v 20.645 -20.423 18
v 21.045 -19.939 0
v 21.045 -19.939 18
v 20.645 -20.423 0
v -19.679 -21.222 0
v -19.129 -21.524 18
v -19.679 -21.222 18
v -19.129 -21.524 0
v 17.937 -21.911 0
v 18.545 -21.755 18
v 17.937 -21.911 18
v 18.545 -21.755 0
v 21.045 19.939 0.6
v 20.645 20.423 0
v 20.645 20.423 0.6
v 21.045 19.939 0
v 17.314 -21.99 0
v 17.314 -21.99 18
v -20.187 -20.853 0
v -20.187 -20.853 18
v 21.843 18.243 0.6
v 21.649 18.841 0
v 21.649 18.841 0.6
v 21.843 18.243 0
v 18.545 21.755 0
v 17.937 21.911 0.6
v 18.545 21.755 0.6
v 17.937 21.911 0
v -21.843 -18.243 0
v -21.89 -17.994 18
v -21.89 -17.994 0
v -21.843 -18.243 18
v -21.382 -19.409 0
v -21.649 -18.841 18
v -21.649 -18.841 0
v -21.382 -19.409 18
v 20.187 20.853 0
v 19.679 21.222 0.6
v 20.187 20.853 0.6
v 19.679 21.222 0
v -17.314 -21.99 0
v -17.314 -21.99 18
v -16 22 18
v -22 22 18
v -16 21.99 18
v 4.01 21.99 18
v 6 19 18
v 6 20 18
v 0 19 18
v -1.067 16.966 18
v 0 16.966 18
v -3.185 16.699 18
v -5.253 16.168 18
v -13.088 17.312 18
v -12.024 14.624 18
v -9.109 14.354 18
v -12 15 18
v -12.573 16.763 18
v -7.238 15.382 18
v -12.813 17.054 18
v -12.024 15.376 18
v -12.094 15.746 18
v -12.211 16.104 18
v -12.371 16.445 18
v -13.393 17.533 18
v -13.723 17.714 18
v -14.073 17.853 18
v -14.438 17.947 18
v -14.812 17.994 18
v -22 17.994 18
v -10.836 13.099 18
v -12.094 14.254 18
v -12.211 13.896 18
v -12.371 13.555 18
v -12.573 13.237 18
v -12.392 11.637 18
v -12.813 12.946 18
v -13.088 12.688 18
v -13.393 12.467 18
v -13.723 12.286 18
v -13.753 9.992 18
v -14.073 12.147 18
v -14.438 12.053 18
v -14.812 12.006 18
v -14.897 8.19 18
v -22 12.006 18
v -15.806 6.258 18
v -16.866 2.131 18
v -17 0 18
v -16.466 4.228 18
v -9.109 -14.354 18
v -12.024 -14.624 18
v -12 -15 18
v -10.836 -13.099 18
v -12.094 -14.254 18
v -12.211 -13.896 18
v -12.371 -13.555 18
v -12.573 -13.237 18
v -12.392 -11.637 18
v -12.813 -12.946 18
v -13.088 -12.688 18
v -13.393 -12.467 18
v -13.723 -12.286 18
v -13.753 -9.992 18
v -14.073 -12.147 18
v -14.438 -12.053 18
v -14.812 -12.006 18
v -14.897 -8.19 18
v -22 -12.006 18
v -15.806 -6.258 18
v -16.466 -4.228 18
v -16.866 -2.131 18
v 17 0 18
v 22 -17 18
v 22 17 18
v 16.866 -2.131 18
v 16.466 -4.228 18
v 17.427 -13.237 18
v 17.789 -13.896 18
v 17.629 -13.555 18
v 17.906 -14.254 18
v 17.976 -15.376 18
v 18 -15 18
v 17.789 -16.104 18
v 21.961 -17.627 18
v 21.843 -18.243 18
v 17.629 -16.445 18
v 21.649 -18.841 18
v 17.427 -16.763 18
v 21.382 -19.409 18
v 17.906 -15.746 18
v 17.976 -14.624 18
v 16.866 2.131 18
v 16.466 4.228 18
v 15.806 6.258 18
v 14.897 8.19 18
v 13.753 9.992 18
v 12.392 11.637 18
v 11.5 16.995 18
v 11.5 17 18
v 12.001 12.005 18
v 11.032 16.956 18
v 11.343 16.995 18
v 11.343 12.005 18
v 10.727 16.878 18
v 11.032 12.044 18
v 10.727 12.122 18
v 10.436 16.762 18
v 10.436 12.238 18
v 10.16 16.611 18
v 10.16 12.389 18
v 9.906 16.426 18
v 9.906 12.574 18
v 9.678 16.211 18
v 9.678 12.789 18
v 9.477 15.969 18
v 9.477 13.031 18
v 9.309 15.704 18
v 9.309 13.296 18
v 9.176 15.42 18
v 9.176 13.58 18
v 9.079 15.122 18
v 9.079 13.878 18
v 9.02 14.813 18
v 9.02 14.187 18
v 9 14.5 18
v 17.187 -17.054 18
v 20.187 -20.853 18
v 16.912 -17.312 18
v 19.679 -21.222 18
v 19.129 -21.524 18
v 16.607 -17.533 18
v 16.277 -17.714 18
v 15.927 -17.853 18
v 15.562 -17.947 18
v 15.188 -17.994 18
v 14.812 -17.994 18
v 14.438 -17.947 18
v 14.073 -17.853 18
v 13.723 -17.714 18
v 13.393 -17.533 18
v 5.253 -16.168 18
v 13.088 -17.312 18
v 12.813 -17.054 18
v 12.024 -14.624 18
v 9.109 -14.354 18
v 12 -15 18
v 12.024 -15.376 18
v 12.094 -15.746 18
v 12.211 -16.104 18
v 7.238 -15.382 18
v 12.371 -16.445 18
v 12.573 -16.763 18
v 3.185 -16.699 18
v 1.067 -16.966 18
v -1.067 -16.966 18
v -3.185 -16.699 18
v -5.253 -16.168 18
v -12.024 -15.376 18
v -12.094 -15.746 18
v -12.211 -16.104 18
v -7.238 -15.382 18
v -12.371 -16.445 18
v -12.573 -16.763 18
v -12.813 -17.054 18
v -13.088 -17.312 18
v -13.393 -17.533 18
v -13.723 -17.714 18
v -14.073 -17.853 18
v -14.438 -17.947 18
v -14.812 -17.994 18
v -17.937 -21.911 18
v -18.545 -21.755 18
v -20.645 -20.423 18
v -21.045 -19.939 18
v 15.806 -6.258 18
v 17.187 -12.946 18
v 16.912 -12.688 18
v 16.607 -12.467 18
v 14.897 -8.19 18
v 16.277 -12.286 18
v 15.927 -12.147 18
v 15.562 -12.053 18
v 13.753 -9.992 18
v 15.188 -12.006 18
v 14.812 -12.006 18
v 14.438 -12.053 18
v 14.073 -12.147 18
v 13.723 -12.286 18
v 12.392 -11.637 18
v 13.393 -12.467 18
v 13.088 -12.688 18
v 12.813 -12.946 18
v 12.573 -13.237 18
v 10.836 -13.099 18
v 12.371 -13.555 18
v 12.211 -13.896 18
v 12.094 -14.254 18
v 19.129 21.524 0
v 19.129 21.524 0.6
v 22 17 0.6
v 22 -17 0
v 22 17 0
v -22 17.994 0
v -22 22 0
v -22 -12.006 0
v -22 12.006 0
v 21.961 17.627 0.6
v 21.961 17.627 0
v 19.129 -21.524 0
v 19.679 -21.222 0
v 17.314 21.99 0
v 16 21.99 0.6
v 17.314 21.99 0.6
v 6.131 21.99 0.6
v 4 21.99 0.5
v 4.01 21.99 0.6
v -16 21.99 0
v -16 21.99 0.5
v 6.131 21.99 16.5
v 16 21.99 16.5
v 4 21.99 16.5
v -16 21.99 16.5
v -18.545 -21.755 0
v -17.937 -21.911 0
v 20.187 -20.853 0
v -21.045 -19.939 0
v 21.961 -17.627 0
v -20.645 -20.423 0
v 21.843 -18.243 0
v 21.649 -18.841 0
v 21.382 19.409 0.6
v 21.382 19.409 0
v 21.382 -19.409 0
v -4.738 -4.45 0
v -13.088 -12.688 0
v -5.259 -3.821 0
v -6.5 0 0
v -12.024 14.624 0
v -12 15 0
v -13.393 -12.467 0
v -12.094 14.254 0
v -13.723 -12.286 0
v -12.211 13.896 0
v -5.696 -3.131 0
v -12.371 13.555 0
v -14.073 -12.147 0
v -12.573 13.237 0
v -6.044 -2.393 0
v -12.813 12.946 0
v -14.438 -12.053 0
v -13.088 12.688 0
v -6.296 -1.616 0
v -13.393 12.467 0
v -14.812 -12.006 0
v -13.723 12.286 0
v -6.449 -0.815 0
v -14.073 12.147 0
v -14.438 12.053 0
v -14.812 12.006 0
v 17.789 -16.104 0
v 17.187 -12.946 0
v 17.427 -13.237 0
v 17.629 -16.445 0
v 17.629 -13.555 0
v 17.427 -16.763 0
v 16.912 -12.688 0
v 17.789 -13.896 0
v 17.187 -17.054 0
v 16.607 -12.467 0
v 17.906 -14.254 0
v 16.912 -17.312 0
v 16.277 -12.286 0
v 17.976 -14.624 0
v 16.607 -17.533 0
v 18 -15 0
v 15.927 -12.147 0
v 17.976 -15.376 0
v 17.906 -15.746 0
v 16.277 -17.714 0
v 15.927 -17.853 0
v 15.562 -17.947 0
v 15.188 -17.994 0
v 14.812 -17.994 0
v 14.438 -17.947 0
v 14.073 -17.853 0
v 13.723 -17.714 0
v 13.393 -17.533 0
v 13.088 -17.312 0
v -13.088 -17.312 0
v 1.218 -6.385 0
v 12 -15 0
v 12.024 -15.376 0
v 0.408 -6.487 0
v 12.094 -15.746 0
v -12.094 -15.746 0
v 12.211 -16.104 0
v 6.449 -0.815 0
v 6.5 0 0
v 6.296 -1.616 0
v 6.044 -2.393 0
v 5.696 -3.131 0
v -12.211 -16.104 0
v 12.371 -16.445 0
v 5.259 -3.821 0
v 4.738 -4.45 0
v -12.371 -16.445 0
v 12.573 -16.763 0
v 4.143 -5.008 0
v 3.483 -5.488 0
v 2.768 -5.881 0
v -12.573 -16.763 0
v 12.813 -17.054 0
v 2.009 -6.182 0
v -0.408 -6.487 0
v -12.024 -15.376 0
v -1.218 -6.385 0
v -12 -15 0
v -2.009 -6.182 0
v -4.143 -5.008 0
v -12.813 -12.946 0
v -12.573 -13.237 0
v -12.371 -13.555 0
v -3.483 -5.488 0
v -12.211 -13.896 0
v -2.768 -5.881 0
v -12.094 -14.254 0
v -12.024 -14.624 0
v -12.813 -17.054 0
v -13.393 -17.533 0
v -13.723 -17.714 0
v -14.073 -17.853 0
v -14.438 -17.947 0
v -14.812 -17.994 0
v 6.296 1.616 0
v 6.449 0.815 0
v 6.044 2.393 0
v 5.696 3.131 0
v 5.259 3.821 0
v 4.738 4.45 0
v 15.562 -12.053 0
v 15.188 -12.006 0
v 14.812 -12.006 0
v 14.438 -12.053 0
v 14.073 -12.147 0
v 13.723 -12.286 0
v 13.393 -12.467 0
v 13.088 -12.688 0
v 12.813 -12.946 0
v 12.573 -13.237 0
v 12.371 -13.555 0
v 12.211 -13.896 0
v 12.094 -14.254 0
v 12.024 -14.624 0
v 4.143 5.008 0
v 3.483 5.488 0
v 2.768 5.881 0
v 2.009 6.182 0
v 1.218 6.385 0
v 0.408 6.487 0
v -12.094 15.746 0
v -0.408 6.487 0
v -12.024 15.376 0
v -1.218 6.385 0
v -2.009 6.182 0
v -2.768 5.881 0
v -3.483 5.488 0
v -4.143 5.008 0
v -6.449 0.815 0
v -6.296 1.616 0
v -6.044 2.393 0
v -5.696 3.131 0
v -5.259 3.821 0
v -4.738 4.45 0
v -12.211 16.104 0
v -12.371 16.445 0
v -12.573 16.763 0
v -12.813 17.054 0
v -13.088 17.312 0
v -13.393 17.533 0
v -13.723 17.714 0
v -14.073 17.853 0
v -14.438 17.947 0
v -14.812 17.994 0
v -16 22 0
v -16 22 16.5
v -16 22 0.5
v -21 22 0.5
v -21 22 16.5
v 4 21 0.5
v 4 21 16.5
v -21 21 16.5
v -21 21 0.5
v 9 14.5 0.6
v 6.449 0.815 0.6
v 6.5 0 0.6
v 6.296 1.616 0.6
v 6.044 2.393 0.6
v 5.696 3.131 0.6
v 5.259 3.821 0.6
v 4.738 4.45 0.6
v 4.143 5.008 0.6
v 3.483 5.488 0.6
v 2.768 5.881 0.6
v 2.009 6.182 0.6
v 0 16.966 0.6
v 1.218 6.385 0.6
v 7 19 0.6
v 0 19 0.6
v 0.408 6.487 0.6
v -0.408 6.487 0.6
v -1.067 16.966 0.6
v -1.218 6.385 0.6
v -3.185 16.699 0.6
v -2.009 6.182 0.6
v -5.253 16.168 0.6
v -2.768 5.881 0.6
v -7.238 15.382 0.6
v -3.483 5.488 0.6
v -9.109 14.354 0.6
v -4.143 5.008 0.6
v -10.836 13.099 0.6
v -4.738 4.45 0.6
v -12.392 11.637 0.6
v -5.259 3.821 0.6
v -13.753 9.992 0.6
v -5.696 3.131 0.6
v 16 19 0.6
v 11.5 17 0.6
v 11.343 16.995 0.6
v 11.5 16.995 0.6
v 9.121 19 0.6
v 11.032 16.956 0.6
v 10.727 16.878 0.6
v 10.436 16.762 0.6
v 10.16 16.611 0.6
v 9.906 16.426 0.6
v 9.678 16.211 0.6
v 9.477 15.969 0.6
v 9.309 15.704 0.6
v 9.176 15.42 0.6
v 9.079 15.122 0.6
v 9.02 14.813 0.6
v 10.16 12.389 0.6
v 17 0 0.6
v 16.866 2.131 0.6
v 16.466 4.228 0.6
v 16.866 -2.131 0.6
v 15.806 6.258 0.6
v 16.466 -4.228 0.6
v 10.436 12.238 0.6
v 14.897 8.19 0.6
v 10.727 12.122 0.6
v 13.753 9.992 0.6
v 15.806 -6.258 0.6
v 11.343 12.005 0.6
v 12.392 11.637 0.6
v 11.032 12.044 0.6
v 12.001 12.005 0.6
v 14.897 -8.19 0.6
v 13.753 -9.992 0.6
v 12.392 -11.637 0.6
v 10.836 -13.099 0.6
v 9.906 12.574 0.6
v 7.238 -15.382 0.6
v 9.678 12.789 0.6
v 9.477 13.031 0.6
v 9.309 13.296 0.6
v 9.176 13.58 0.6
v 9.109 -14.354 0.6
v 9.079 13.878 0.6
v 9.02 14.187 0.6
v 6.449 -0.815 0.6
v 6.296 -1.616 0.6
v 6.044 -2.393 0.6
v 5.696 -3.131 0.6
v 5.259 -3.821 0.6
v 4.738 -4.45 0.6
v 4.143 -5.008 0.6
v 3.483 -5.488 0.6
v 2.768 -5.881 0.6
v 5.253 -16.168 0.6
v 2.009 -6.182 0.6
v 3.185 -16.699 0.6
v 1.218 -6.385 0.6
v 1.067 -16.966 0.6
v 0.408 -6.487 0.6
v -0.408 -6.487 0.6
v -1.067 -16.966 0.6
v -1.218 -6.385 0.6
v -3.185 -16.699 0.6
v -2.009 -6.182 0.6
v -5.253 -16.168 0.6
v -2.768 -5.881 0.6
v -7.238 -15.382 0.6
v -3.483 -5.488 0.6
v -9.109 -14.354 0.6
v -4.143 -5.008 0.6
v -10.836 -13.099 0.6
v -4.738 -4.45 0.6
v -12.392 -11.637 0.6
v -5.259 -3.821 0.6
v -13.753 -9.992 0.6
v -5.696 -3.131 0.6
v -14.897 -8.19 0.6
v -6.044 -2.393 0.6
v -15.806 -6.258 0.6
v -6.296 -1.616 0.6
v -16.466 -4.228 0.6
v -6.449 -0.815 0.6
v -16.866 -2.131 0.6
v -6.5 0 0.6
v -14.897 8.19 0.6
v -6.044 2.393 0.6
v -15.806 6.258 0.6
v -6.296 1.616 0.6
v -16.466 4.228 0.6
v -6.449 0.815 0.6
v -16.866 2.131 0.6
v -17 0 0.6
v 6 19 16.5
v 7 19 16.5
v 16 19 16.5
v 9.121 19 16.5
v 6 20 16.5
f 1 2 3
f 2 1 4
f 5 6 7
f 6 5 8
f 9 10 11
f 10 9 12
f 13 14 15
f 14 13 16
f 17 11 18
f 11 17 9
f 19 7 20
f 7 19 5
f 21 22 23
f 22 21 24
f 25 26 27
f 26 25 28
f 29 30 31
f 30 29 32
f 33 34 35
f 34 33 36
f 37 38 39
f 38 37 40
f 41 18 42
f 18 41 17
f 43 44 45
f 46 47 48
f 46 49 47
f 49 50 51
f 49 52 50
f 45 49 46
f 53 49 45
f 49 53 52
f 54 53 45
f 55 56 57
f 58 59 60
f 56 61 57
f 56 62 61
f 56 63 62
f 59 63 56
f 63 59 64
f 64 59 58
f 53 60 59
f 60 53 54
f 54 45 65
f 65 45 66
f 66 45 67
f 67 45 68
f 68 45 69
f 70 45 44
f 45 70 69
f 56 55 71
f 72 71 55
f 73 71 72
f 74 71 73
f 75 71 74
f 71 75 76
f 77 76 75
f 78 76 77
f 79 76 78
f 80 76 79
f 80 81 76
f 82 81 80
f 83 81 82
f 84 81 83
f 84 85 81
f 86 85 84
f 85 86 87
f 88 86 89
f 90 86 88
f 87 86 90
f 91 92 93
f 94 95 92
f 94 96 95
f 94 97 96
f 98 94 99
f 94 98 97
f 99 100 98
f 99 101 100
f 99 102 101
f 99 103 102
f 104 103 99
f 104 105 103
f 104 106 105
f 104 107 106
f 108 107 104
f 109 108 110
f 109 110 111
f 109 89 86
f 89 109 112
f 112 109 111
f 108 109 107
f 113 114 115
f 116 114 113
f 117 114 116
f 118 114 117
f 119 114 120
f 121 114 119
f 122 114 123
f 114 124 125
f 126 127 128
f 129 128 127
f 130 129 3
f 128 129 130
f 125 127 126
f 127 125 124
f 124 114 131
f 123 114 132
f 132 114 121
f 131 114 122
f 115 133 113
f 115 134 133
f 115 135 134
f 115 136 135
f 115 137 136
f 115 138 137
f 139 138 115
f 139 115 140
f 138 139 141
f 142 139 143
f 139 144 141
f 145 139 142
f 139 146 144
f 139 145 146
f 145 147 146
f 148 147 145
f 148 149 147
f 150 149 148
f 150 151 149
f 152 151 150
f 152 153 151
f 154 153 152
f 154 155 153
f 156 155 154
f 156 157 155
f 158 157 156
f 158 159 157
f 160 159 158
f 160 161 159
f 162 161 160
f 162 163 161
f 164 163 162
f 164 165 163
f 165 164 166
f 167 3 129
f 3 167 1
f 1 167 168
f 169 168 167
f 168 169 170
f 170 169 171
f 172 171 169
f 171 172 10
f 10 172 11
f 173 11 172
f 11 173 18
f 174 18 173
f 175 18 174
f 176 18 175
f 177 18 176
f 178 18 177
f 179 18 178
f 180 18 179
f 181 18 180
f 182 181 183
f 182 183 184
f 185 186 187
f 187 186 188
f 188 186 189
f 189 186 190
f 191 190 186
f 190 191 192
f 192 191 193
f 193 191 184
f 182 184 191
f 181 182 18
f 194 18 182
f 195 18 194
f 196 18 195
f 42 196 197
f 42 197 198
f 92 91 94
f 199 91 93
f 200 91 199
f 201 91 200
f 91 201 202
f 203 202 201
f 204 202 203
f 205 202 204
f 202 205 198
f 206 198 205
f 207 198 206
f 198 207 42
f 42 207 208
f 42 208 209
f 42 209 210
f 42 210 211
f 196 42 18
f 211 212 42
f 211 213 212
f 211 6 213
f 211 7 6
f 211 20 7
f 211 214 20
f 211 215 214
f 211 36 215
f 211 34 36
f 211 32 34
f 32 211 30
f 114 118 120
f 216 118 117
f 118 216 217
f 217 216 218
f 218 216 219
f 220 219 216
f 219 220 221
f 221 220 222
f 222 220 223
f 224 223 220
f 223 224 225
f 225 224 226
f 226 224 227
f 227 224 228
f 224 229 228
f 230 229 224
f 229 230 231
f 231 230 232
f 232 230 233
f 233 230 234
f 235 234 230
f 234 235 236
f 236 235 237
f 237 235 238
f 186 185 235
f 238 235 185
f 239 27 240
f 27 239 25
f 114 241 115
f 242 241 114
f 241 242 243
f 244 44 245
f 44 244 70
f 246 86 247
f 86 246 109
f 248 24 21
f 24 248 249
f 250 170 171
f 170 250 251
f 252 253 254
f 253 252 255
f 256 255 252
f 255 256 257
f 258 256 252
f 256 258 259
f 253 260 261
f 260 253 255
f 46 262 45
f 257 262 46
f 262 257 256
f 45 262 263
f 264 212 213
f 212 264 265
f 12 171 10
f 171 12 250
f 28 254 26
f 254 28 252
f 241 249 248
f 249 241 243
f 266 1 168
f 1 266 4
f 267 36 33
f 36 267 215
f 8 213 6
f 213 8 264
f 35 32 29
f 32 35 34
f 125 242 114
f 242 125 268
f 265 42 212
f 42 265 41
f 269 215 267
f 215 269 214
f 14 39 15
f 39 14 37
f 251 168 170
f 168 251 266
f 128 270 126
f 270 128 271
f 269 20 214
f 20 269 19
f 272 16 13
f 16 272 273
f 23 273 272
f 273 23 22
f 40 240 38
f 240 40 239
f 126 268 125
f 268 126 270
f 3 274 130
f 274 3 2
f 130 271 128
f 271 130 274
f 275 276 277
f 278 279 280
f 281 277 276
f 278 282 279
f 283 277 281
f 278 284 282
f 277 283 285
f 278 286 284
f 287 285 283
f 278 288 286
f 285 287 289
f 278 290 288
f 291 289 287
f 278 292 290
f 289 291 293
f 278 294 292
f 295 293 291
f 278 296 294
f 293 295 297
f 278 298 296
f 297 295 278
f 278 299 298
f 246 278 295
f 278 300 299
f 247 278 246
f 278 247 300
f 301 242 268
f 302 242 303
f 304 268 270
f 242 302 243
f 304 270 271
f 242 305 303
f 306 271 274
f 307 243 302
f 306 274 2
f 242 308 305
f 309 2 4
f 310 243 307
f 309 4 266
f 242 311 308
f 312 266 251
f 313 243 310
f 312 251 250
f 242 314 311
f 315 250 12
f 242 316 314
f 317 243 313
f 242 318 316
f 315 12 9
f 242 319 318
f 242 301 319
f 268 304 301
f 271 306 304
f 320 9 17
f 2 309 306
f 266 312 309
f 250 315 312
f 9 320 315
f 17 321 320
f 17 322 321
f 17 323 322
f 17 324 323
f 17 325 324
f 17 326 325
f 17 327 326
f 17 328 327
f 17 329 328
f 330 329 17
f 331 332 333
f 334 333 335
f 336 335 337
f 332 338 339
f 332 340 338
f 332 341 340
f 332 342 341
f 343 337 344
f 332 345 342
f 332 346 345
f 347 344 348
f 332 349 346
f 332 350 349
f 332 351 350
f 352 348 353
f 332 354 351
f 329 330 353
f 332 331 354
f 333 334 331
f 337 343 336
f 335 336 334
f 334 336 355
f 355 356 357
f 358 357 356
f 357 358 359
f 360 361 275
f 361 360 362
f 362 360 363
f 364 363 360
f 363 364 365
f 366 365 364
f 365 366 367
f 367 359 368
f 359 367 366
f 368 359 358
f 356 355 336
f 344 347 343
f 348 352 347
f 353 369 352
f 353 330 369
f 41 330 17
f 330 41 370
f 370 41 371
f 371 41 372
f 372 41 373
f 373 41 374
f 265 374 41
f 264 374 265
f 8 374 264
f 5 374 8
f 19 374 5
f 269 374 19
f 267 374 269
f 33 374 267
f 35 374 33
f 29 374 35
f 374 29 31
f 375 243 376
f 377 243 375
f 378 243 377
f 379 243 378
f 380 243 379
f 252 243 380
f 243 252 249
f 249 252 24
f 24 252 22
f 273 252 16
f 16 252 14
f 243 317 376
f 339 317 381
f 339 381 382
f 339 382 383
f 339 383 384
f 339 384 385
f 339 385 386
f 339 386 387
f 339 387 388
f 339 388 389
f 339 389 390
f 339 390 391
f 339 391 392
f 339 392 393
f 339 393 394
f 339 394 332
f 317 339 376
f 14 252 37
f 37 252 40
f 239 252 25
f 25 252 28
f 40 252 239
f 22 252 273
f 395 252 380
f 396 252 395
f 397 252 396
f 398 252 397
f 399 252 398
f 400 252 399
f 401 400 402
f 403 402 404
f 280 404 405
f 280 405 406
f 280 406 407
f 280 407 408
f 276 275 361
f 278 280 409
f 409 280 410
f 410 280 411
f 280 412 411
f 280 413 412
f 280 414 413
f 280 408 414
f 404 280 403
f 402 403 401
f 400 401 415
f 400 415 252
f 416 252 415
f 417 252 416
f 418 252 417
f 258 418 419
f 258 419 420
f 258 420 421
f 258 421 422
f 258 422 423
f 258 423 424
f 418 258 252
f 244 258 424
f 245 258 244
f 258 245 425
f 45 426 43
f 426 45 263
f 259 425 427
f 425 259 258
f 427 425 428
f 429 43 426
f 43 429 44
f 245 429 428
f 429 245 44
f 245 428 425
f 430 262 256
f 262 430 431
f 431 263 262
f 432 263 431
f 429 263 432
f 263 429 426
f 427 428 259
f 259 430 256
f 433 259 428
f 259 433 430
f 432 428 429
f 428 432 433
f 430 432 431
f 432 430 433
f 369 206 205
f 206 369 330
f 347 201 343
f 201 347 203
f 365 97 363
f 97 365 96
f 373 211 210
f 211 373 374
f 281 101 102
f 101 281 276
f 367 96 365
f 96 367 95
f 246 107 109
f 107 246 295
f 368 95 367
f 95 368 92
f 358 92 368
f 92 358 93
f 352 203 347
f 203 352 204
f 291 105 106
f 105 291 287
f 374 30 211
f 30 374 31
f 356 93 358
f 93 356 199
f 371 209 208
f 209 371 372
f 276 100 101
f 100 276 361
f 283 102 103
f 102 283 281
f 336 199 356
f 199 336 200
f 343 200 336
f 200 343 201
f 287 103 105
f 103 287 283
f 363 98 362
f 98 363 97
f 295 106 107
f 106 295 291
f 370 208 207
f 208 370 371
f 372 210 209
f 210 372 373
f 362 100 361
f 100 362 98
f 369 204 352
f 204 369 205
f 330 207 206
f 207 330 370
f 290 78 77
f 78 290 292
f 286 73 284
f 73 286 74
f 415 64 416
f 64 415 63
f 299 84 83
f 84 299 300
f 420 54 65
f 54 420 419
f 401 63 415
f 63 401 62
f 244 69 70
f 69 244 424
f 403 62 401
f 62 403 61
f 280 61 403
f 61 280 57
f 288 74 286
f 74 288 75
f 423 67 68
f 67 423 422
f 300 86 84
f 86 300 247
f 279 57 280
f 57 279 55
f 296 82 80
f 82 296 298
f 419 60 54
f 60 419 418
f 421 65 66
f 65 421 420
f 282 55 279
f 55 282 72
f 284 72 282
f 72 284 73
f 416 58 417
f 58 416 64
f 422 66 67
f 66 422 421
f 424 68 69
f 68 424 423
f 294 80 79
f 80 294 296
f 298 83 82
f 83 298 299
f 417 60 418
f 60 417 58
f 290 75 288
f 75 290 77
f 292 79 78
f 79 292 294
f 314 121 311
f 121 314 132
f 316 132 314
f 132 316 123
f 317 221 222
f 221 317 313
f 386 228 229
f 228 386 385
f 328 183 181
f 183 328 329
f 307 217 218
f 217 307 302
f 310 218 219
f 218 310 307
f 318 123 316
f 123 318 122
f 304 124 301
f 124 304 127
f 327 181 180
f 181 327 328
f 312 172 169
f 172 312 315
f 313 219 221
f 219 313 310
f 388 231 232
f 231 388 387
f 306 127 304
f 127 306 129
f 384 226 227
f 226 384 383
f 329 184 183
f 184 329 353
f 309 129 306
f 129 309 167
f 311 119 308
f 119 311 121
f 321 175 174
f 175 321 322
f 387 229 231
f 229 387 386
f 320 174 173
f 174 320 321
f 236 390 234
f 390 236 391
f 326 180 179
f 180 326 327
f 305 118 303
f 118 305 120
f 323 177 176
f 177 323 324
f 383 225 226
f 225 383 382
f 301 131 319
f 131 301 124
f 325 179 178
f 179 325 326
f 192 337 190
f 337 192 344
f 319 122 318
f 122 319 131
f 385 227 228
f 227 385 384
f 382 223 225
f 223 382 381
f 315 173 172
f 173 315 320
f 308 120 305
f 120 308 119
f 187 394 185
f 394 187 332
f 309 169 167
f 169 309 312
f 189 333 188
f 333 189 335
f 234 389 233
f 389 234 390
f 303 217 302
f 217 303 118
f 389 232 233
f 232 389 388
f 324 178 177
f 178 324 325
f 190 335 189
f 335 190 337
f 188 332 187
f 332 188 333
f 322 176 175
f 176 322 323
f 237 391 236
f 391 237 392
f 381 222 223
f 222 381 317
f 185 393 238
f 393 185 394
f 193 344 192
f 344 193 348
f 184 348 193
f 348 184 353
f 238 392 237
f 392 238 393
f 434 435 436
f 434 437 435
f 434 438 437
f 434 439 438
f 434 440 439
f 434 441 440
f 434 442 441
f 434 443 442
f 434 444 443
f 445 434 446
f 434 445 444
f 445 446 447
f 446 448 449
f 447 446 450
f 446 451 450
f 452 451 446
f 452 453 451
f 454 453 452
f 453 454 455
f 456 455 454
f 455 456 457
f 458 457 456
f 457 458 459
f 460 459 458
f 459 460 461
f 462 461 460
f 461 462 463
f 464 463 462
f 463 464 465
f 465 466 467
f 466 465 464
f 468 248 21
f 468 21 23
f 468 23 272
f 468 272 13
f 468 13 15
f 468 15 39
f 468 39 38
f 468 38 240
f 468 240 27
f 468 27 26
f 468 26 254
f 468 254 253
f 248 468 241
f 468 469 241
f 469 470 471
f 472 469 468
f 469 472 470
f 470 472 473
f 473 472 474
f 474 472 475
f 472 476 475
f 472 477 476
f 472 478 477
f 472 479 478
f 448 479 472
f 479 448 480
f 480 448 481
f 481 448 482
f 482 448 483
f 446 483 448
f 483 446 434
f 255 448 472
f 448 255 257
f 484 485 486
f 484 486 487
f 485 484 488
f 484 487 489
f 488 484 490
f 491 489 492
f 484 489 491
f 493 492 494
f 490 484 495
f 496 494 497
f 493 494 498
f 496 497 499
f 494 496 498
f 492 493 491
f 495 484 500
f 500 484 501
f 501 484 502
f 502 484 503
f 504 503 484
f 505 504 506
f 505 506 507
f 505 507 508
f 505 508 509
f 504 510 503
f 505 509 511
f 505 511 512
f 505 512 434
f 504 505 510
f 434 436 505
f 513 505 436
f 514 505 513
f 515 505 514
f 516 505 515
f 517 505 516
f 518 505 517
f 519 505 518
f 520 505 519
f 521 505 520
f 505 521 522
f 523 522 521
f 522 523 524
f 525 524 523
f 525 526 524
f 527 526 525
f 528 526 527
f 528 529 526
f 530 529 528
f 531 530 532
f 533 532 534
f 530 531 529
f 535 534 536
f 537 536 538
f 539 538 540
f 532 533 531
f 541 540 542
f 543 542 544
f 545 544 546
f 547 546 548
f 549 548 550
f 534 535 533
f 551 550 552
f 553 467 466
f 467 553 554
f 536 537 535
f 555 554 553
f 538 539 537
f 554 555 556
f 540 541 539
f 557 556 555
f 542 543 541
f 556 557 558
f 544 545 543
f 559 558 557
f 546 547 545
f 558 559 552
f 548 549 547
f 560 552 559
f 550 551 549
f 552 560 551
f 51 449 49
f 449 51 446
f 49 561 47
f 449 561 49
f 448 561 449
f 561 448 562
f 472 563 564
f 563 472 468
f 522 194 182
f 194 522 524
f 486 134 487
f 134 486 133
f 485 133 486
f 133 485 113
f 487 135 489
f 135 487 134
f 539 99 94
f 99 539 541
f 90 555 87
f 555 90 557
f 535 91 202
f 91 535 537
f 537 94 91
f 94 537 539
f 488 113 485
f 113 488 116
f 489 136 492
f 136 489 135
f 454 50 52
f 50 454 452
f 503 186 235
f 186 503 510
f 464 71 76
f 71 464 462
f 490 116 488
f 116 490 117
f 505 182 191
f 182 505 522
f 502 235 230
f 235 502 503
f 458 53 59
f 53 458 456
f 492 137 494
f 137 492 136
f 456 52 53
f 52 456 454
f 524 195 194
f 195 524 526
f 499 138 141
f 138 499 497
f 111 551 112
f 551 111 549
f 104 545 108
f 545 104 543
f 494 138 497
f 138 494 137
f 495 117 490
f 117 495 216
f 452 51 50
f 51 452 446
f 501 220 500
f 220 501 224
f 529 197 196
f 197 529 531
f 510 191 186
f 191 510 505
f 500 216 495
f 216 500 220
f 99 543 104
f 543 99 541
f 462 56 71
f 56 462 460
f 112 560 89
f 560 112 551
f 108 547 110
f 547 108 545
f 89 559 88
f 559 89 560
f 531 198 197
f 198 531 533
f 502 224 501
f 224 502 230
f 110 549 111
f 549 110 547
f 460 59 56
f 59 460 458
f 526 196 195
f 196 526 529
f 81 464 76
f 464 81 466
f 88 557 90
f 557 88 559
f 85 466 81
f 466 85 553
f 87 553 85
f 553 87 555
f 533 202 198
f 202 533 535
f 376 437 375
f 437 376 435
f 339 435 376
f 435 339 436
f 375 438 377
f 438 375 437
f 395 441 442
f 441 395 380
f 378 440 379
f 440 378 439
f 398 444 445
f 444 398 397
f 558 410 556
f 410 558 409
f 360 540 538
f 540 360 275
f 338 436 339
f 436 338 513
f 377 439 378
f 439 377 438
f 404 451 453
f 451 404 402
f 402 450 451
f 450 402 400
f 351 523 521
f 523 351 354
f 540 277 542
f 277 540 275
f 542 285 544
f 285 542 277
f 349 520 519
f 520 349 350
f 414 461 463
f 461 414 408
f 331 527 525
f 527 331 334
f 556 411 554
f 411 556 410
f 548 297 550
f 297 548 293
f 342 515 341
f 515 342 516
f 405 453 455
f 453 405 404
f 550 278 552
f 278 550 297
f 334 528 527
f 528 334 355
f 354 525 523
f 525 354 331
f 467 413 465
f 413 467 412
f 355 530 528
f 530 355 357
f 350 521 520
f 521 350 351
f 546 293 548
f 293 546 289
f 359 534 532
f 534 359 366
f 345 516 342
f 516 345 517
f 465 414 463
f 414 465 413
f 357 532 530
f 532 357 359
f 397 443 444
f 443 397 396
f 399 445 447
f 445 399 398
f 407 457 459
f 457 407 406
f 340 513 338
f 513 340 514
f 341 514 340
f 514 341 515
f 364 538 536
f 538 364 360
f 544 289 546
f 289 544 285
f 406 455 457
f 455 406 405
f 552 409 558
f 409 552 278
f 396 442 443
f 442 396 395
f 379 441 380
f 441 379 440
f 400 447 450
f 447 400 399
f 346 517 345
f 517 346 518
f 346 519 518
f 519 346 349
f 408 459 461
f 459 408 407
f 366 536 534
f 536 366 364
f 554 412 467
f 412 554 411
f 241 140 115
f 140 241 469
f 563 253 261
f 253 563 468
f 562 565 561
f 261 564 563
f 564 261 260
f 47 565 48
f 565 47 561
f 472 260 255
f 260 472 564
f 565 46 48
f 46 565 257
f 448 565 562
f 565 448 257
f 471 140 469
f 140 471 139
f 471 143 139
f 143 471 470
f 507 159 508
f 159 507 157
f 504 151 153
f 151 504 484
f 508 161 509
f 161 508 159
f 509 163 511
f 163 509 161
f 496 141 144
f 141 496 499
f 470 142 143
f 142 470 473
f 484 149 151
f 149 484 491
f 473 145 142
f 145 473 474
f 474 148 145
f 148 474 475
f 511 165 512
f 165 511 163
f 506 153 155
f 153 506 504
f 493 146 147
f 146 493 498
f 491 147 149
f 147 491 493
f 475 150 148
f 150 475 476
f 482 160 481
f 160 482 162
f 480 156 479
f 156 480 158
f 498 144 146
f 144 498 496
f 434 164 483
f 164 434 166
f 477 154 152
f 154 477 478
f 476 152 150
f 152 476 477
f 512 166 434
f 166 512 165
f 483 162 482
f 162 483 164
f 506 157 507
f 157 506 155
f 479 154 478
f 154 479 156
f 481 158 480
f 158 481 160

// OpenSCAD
$fn = 50;


union() {
	difference() {
		union() {
			translate(v = [0, 0, 0]) {
				rotate(a = [0, 0, 0]) {
					hull() {
						translate(v = [-17.0000000000, 17.0000000000, 0]) {
							rotate(a = [0, 0, 0]) {
								translate(v = [0, 0, 0]) {
									rotate(a = [0, 0, 0]) {
										cylinder(h = 18, r = 5);
									}
								}
							}
						}
						translate(v = [17.0000000000, 17.0000000000, 0]) {
							rotate(a = [0, 0, 0]) {
								translate(v = [0, 0, 0]) {
									rotate(a = [0, 0, 0]) {
										cylinder(h = 18, r = 5);
									}
								}
							}
						}
						translate(v = [-17.0000000000, -17.0000000000, 0]) {
							rotate(a = [0, 0, 0]) {
								translate(v = [0, 0, 0]) {
									rotate(a = [0, 0, 0]) {
										cylinder(h = 18, r = 5);
									}
								}
							}
						}
						translate(v = [17.0000000000, -17.0000000000, 0]) {
							rotate(a = [0, 0, 0]) {
								translate(v = [0, 0, 0]) {
									rotate(a = [0, 0, 0]) {
										cylinder(h = 18, r = 5);
									}
								}
							}
						}
					}
				}
			}
			translate(v = [-22.0000000000, 16.0000000000, 0]) {
				rotate(a = [0, 0, 0]) {
					cube(size = [6, 6, 18]);
				}
			}
		}
		union() {
			#translate(v = [-21.0000000000, 21.0000000000, 0.5000000000]) {
				rotate(a = [0, 0, 0]) {
					cube(size = [25, 1, 16]);
				}
			}
			translate(v = [-22.5000000000, -15.0000000000, -125]) {
				rotate(a = [0, 0, 0]) {
					hull() {
						translate(v = [7.5000000000, 0, 0]) {
							rotate(a = [0, 0, 0]) {
								translate(v = [0, 0, 0]) {
									rotate(a = [0, 0, 0]) {
										cylinder(h = 250, r = 3.0000000000);
									}
								}
							}
						}
						translate(v = [-7.5000000000, 0, 0]) {
							rotate(a = [0, 0, 0]) {
								translate(v = [0, 0, 0]) {
									rotate(a = [0, 0, 0]) {
										cylinder(h = 250, r = 3.0000000000);
									}
								}
							}
						}
					}
				}
			}
			translate(v = [-22.5000000000, 15.0000000000, -125]) {
				rotate(a = [0, 0, 0]) {
					hull() {
						translate(v = [7.5000000000, 0, 0]) {
							rotate(a = [0, 0, 0]) {
								translate(v = [0, 0, 0]) {
									rotate(a = [0, 0, 0]) {
										cylinder(h = 250, r = 3.0000000000);
									}
								}
							}
						}
						translate(v = [-7.5000000000, 0, 0]) {
							rotate(a = [0, 0, 0]) {
								translate(v = [0, 0, 0]) {
									rotate(a = [0, 0, 0]) {
										cylinder(h = 250, r = 3.0000000000);
									}
								}
							}
						}
					}
				}
			}
			translate(v = [15.0000000000, -15.0000000000, -125.0000000000]) {
				rotate(a = [0, 0, 0]) {
					cylinder(h = 250, r = 3.0000000000);
				}
			}
			translate(v = [0.0000000000, 11.0000000000, 0.6000000000]) {
				rotate(a = [0, 0, 0]) {
					cube(size = [11, 8, 20.4000000000]);
				}
			}
			translate(v = [0, 0, 0.6000000000]) {
				rotate(a = [0, 0, 0]) {
					cylinder(h = 20.4000000000, r = 17.0000000000);
				}
			}
			translate(v = [0, 0, -9.0000000000]) {
				rotate(a = [0, 0, 0]) {
					cylinder(h = 18, r = 6.5000000000);
				}
			}
			translate(v = [0.0000000000, 17.0000000000, 0.6000000000]) {
				rotate(a = [0, 0, 0]) {
					cube(size = [22.0000000000, 2, 20.4000000000]);
				}
			}
			translate(v = [16.0000000000, 17.0000000000, 0.6000000000]) {
				rotate(a = [0, 0, 0]) {
					cube(size = [6, 5, 20.4000000000]);
				}
			}
			translate(v = [6.0000000000, 17.0000000000, 16.5000000000]) {
				rotate(a = [0, 0, 0]) {
					cube(size = [16, 5, 1.5000000000]);
				}
			}
			translate(v = [3.2500000000, 22.7500000000, 0.6000000000]) {
				rotate(a = [0, 0, -45]) {
					cube(size = [7.5000000000, 1.5000000000, 20.4000000000]);
				}
			}
			translate(v = [2.5000000000, 12.0000000000, 0.6000000000]) {
				rotate(a = [0, 0, 0]) {
					cube(size = [9.0000000000, 5, 17.4000000000]);
				}
			}
		}
	}
	union() {
		translate(v = [14, 14.5000000000, 0]) {
			rotate(a = [0, 0, 0]) {
				hull() {
					translate(v = [2.5000000000, 0, 0]) {
						rotate(a = [0, 0, 0]) {
							#translate(v = [0, 0, 0]) {
								rotate(a = [0, 0, 0]) {
									cylinder(h = 18, r = 2.5000000000);
								}
							}
						}
					}
					translate(v = [-2.5000000000, 0, 0]) {
						rotate(a = [0, 0, 0]) {
							#translate(v = [0, 0, 0]) {
								rotate(a = [0, 0, 0]) {
									cylinder(h = 18, r = 2.5000000000);
								}
							}
						}
					}
				}
			}
		}
	}
}
